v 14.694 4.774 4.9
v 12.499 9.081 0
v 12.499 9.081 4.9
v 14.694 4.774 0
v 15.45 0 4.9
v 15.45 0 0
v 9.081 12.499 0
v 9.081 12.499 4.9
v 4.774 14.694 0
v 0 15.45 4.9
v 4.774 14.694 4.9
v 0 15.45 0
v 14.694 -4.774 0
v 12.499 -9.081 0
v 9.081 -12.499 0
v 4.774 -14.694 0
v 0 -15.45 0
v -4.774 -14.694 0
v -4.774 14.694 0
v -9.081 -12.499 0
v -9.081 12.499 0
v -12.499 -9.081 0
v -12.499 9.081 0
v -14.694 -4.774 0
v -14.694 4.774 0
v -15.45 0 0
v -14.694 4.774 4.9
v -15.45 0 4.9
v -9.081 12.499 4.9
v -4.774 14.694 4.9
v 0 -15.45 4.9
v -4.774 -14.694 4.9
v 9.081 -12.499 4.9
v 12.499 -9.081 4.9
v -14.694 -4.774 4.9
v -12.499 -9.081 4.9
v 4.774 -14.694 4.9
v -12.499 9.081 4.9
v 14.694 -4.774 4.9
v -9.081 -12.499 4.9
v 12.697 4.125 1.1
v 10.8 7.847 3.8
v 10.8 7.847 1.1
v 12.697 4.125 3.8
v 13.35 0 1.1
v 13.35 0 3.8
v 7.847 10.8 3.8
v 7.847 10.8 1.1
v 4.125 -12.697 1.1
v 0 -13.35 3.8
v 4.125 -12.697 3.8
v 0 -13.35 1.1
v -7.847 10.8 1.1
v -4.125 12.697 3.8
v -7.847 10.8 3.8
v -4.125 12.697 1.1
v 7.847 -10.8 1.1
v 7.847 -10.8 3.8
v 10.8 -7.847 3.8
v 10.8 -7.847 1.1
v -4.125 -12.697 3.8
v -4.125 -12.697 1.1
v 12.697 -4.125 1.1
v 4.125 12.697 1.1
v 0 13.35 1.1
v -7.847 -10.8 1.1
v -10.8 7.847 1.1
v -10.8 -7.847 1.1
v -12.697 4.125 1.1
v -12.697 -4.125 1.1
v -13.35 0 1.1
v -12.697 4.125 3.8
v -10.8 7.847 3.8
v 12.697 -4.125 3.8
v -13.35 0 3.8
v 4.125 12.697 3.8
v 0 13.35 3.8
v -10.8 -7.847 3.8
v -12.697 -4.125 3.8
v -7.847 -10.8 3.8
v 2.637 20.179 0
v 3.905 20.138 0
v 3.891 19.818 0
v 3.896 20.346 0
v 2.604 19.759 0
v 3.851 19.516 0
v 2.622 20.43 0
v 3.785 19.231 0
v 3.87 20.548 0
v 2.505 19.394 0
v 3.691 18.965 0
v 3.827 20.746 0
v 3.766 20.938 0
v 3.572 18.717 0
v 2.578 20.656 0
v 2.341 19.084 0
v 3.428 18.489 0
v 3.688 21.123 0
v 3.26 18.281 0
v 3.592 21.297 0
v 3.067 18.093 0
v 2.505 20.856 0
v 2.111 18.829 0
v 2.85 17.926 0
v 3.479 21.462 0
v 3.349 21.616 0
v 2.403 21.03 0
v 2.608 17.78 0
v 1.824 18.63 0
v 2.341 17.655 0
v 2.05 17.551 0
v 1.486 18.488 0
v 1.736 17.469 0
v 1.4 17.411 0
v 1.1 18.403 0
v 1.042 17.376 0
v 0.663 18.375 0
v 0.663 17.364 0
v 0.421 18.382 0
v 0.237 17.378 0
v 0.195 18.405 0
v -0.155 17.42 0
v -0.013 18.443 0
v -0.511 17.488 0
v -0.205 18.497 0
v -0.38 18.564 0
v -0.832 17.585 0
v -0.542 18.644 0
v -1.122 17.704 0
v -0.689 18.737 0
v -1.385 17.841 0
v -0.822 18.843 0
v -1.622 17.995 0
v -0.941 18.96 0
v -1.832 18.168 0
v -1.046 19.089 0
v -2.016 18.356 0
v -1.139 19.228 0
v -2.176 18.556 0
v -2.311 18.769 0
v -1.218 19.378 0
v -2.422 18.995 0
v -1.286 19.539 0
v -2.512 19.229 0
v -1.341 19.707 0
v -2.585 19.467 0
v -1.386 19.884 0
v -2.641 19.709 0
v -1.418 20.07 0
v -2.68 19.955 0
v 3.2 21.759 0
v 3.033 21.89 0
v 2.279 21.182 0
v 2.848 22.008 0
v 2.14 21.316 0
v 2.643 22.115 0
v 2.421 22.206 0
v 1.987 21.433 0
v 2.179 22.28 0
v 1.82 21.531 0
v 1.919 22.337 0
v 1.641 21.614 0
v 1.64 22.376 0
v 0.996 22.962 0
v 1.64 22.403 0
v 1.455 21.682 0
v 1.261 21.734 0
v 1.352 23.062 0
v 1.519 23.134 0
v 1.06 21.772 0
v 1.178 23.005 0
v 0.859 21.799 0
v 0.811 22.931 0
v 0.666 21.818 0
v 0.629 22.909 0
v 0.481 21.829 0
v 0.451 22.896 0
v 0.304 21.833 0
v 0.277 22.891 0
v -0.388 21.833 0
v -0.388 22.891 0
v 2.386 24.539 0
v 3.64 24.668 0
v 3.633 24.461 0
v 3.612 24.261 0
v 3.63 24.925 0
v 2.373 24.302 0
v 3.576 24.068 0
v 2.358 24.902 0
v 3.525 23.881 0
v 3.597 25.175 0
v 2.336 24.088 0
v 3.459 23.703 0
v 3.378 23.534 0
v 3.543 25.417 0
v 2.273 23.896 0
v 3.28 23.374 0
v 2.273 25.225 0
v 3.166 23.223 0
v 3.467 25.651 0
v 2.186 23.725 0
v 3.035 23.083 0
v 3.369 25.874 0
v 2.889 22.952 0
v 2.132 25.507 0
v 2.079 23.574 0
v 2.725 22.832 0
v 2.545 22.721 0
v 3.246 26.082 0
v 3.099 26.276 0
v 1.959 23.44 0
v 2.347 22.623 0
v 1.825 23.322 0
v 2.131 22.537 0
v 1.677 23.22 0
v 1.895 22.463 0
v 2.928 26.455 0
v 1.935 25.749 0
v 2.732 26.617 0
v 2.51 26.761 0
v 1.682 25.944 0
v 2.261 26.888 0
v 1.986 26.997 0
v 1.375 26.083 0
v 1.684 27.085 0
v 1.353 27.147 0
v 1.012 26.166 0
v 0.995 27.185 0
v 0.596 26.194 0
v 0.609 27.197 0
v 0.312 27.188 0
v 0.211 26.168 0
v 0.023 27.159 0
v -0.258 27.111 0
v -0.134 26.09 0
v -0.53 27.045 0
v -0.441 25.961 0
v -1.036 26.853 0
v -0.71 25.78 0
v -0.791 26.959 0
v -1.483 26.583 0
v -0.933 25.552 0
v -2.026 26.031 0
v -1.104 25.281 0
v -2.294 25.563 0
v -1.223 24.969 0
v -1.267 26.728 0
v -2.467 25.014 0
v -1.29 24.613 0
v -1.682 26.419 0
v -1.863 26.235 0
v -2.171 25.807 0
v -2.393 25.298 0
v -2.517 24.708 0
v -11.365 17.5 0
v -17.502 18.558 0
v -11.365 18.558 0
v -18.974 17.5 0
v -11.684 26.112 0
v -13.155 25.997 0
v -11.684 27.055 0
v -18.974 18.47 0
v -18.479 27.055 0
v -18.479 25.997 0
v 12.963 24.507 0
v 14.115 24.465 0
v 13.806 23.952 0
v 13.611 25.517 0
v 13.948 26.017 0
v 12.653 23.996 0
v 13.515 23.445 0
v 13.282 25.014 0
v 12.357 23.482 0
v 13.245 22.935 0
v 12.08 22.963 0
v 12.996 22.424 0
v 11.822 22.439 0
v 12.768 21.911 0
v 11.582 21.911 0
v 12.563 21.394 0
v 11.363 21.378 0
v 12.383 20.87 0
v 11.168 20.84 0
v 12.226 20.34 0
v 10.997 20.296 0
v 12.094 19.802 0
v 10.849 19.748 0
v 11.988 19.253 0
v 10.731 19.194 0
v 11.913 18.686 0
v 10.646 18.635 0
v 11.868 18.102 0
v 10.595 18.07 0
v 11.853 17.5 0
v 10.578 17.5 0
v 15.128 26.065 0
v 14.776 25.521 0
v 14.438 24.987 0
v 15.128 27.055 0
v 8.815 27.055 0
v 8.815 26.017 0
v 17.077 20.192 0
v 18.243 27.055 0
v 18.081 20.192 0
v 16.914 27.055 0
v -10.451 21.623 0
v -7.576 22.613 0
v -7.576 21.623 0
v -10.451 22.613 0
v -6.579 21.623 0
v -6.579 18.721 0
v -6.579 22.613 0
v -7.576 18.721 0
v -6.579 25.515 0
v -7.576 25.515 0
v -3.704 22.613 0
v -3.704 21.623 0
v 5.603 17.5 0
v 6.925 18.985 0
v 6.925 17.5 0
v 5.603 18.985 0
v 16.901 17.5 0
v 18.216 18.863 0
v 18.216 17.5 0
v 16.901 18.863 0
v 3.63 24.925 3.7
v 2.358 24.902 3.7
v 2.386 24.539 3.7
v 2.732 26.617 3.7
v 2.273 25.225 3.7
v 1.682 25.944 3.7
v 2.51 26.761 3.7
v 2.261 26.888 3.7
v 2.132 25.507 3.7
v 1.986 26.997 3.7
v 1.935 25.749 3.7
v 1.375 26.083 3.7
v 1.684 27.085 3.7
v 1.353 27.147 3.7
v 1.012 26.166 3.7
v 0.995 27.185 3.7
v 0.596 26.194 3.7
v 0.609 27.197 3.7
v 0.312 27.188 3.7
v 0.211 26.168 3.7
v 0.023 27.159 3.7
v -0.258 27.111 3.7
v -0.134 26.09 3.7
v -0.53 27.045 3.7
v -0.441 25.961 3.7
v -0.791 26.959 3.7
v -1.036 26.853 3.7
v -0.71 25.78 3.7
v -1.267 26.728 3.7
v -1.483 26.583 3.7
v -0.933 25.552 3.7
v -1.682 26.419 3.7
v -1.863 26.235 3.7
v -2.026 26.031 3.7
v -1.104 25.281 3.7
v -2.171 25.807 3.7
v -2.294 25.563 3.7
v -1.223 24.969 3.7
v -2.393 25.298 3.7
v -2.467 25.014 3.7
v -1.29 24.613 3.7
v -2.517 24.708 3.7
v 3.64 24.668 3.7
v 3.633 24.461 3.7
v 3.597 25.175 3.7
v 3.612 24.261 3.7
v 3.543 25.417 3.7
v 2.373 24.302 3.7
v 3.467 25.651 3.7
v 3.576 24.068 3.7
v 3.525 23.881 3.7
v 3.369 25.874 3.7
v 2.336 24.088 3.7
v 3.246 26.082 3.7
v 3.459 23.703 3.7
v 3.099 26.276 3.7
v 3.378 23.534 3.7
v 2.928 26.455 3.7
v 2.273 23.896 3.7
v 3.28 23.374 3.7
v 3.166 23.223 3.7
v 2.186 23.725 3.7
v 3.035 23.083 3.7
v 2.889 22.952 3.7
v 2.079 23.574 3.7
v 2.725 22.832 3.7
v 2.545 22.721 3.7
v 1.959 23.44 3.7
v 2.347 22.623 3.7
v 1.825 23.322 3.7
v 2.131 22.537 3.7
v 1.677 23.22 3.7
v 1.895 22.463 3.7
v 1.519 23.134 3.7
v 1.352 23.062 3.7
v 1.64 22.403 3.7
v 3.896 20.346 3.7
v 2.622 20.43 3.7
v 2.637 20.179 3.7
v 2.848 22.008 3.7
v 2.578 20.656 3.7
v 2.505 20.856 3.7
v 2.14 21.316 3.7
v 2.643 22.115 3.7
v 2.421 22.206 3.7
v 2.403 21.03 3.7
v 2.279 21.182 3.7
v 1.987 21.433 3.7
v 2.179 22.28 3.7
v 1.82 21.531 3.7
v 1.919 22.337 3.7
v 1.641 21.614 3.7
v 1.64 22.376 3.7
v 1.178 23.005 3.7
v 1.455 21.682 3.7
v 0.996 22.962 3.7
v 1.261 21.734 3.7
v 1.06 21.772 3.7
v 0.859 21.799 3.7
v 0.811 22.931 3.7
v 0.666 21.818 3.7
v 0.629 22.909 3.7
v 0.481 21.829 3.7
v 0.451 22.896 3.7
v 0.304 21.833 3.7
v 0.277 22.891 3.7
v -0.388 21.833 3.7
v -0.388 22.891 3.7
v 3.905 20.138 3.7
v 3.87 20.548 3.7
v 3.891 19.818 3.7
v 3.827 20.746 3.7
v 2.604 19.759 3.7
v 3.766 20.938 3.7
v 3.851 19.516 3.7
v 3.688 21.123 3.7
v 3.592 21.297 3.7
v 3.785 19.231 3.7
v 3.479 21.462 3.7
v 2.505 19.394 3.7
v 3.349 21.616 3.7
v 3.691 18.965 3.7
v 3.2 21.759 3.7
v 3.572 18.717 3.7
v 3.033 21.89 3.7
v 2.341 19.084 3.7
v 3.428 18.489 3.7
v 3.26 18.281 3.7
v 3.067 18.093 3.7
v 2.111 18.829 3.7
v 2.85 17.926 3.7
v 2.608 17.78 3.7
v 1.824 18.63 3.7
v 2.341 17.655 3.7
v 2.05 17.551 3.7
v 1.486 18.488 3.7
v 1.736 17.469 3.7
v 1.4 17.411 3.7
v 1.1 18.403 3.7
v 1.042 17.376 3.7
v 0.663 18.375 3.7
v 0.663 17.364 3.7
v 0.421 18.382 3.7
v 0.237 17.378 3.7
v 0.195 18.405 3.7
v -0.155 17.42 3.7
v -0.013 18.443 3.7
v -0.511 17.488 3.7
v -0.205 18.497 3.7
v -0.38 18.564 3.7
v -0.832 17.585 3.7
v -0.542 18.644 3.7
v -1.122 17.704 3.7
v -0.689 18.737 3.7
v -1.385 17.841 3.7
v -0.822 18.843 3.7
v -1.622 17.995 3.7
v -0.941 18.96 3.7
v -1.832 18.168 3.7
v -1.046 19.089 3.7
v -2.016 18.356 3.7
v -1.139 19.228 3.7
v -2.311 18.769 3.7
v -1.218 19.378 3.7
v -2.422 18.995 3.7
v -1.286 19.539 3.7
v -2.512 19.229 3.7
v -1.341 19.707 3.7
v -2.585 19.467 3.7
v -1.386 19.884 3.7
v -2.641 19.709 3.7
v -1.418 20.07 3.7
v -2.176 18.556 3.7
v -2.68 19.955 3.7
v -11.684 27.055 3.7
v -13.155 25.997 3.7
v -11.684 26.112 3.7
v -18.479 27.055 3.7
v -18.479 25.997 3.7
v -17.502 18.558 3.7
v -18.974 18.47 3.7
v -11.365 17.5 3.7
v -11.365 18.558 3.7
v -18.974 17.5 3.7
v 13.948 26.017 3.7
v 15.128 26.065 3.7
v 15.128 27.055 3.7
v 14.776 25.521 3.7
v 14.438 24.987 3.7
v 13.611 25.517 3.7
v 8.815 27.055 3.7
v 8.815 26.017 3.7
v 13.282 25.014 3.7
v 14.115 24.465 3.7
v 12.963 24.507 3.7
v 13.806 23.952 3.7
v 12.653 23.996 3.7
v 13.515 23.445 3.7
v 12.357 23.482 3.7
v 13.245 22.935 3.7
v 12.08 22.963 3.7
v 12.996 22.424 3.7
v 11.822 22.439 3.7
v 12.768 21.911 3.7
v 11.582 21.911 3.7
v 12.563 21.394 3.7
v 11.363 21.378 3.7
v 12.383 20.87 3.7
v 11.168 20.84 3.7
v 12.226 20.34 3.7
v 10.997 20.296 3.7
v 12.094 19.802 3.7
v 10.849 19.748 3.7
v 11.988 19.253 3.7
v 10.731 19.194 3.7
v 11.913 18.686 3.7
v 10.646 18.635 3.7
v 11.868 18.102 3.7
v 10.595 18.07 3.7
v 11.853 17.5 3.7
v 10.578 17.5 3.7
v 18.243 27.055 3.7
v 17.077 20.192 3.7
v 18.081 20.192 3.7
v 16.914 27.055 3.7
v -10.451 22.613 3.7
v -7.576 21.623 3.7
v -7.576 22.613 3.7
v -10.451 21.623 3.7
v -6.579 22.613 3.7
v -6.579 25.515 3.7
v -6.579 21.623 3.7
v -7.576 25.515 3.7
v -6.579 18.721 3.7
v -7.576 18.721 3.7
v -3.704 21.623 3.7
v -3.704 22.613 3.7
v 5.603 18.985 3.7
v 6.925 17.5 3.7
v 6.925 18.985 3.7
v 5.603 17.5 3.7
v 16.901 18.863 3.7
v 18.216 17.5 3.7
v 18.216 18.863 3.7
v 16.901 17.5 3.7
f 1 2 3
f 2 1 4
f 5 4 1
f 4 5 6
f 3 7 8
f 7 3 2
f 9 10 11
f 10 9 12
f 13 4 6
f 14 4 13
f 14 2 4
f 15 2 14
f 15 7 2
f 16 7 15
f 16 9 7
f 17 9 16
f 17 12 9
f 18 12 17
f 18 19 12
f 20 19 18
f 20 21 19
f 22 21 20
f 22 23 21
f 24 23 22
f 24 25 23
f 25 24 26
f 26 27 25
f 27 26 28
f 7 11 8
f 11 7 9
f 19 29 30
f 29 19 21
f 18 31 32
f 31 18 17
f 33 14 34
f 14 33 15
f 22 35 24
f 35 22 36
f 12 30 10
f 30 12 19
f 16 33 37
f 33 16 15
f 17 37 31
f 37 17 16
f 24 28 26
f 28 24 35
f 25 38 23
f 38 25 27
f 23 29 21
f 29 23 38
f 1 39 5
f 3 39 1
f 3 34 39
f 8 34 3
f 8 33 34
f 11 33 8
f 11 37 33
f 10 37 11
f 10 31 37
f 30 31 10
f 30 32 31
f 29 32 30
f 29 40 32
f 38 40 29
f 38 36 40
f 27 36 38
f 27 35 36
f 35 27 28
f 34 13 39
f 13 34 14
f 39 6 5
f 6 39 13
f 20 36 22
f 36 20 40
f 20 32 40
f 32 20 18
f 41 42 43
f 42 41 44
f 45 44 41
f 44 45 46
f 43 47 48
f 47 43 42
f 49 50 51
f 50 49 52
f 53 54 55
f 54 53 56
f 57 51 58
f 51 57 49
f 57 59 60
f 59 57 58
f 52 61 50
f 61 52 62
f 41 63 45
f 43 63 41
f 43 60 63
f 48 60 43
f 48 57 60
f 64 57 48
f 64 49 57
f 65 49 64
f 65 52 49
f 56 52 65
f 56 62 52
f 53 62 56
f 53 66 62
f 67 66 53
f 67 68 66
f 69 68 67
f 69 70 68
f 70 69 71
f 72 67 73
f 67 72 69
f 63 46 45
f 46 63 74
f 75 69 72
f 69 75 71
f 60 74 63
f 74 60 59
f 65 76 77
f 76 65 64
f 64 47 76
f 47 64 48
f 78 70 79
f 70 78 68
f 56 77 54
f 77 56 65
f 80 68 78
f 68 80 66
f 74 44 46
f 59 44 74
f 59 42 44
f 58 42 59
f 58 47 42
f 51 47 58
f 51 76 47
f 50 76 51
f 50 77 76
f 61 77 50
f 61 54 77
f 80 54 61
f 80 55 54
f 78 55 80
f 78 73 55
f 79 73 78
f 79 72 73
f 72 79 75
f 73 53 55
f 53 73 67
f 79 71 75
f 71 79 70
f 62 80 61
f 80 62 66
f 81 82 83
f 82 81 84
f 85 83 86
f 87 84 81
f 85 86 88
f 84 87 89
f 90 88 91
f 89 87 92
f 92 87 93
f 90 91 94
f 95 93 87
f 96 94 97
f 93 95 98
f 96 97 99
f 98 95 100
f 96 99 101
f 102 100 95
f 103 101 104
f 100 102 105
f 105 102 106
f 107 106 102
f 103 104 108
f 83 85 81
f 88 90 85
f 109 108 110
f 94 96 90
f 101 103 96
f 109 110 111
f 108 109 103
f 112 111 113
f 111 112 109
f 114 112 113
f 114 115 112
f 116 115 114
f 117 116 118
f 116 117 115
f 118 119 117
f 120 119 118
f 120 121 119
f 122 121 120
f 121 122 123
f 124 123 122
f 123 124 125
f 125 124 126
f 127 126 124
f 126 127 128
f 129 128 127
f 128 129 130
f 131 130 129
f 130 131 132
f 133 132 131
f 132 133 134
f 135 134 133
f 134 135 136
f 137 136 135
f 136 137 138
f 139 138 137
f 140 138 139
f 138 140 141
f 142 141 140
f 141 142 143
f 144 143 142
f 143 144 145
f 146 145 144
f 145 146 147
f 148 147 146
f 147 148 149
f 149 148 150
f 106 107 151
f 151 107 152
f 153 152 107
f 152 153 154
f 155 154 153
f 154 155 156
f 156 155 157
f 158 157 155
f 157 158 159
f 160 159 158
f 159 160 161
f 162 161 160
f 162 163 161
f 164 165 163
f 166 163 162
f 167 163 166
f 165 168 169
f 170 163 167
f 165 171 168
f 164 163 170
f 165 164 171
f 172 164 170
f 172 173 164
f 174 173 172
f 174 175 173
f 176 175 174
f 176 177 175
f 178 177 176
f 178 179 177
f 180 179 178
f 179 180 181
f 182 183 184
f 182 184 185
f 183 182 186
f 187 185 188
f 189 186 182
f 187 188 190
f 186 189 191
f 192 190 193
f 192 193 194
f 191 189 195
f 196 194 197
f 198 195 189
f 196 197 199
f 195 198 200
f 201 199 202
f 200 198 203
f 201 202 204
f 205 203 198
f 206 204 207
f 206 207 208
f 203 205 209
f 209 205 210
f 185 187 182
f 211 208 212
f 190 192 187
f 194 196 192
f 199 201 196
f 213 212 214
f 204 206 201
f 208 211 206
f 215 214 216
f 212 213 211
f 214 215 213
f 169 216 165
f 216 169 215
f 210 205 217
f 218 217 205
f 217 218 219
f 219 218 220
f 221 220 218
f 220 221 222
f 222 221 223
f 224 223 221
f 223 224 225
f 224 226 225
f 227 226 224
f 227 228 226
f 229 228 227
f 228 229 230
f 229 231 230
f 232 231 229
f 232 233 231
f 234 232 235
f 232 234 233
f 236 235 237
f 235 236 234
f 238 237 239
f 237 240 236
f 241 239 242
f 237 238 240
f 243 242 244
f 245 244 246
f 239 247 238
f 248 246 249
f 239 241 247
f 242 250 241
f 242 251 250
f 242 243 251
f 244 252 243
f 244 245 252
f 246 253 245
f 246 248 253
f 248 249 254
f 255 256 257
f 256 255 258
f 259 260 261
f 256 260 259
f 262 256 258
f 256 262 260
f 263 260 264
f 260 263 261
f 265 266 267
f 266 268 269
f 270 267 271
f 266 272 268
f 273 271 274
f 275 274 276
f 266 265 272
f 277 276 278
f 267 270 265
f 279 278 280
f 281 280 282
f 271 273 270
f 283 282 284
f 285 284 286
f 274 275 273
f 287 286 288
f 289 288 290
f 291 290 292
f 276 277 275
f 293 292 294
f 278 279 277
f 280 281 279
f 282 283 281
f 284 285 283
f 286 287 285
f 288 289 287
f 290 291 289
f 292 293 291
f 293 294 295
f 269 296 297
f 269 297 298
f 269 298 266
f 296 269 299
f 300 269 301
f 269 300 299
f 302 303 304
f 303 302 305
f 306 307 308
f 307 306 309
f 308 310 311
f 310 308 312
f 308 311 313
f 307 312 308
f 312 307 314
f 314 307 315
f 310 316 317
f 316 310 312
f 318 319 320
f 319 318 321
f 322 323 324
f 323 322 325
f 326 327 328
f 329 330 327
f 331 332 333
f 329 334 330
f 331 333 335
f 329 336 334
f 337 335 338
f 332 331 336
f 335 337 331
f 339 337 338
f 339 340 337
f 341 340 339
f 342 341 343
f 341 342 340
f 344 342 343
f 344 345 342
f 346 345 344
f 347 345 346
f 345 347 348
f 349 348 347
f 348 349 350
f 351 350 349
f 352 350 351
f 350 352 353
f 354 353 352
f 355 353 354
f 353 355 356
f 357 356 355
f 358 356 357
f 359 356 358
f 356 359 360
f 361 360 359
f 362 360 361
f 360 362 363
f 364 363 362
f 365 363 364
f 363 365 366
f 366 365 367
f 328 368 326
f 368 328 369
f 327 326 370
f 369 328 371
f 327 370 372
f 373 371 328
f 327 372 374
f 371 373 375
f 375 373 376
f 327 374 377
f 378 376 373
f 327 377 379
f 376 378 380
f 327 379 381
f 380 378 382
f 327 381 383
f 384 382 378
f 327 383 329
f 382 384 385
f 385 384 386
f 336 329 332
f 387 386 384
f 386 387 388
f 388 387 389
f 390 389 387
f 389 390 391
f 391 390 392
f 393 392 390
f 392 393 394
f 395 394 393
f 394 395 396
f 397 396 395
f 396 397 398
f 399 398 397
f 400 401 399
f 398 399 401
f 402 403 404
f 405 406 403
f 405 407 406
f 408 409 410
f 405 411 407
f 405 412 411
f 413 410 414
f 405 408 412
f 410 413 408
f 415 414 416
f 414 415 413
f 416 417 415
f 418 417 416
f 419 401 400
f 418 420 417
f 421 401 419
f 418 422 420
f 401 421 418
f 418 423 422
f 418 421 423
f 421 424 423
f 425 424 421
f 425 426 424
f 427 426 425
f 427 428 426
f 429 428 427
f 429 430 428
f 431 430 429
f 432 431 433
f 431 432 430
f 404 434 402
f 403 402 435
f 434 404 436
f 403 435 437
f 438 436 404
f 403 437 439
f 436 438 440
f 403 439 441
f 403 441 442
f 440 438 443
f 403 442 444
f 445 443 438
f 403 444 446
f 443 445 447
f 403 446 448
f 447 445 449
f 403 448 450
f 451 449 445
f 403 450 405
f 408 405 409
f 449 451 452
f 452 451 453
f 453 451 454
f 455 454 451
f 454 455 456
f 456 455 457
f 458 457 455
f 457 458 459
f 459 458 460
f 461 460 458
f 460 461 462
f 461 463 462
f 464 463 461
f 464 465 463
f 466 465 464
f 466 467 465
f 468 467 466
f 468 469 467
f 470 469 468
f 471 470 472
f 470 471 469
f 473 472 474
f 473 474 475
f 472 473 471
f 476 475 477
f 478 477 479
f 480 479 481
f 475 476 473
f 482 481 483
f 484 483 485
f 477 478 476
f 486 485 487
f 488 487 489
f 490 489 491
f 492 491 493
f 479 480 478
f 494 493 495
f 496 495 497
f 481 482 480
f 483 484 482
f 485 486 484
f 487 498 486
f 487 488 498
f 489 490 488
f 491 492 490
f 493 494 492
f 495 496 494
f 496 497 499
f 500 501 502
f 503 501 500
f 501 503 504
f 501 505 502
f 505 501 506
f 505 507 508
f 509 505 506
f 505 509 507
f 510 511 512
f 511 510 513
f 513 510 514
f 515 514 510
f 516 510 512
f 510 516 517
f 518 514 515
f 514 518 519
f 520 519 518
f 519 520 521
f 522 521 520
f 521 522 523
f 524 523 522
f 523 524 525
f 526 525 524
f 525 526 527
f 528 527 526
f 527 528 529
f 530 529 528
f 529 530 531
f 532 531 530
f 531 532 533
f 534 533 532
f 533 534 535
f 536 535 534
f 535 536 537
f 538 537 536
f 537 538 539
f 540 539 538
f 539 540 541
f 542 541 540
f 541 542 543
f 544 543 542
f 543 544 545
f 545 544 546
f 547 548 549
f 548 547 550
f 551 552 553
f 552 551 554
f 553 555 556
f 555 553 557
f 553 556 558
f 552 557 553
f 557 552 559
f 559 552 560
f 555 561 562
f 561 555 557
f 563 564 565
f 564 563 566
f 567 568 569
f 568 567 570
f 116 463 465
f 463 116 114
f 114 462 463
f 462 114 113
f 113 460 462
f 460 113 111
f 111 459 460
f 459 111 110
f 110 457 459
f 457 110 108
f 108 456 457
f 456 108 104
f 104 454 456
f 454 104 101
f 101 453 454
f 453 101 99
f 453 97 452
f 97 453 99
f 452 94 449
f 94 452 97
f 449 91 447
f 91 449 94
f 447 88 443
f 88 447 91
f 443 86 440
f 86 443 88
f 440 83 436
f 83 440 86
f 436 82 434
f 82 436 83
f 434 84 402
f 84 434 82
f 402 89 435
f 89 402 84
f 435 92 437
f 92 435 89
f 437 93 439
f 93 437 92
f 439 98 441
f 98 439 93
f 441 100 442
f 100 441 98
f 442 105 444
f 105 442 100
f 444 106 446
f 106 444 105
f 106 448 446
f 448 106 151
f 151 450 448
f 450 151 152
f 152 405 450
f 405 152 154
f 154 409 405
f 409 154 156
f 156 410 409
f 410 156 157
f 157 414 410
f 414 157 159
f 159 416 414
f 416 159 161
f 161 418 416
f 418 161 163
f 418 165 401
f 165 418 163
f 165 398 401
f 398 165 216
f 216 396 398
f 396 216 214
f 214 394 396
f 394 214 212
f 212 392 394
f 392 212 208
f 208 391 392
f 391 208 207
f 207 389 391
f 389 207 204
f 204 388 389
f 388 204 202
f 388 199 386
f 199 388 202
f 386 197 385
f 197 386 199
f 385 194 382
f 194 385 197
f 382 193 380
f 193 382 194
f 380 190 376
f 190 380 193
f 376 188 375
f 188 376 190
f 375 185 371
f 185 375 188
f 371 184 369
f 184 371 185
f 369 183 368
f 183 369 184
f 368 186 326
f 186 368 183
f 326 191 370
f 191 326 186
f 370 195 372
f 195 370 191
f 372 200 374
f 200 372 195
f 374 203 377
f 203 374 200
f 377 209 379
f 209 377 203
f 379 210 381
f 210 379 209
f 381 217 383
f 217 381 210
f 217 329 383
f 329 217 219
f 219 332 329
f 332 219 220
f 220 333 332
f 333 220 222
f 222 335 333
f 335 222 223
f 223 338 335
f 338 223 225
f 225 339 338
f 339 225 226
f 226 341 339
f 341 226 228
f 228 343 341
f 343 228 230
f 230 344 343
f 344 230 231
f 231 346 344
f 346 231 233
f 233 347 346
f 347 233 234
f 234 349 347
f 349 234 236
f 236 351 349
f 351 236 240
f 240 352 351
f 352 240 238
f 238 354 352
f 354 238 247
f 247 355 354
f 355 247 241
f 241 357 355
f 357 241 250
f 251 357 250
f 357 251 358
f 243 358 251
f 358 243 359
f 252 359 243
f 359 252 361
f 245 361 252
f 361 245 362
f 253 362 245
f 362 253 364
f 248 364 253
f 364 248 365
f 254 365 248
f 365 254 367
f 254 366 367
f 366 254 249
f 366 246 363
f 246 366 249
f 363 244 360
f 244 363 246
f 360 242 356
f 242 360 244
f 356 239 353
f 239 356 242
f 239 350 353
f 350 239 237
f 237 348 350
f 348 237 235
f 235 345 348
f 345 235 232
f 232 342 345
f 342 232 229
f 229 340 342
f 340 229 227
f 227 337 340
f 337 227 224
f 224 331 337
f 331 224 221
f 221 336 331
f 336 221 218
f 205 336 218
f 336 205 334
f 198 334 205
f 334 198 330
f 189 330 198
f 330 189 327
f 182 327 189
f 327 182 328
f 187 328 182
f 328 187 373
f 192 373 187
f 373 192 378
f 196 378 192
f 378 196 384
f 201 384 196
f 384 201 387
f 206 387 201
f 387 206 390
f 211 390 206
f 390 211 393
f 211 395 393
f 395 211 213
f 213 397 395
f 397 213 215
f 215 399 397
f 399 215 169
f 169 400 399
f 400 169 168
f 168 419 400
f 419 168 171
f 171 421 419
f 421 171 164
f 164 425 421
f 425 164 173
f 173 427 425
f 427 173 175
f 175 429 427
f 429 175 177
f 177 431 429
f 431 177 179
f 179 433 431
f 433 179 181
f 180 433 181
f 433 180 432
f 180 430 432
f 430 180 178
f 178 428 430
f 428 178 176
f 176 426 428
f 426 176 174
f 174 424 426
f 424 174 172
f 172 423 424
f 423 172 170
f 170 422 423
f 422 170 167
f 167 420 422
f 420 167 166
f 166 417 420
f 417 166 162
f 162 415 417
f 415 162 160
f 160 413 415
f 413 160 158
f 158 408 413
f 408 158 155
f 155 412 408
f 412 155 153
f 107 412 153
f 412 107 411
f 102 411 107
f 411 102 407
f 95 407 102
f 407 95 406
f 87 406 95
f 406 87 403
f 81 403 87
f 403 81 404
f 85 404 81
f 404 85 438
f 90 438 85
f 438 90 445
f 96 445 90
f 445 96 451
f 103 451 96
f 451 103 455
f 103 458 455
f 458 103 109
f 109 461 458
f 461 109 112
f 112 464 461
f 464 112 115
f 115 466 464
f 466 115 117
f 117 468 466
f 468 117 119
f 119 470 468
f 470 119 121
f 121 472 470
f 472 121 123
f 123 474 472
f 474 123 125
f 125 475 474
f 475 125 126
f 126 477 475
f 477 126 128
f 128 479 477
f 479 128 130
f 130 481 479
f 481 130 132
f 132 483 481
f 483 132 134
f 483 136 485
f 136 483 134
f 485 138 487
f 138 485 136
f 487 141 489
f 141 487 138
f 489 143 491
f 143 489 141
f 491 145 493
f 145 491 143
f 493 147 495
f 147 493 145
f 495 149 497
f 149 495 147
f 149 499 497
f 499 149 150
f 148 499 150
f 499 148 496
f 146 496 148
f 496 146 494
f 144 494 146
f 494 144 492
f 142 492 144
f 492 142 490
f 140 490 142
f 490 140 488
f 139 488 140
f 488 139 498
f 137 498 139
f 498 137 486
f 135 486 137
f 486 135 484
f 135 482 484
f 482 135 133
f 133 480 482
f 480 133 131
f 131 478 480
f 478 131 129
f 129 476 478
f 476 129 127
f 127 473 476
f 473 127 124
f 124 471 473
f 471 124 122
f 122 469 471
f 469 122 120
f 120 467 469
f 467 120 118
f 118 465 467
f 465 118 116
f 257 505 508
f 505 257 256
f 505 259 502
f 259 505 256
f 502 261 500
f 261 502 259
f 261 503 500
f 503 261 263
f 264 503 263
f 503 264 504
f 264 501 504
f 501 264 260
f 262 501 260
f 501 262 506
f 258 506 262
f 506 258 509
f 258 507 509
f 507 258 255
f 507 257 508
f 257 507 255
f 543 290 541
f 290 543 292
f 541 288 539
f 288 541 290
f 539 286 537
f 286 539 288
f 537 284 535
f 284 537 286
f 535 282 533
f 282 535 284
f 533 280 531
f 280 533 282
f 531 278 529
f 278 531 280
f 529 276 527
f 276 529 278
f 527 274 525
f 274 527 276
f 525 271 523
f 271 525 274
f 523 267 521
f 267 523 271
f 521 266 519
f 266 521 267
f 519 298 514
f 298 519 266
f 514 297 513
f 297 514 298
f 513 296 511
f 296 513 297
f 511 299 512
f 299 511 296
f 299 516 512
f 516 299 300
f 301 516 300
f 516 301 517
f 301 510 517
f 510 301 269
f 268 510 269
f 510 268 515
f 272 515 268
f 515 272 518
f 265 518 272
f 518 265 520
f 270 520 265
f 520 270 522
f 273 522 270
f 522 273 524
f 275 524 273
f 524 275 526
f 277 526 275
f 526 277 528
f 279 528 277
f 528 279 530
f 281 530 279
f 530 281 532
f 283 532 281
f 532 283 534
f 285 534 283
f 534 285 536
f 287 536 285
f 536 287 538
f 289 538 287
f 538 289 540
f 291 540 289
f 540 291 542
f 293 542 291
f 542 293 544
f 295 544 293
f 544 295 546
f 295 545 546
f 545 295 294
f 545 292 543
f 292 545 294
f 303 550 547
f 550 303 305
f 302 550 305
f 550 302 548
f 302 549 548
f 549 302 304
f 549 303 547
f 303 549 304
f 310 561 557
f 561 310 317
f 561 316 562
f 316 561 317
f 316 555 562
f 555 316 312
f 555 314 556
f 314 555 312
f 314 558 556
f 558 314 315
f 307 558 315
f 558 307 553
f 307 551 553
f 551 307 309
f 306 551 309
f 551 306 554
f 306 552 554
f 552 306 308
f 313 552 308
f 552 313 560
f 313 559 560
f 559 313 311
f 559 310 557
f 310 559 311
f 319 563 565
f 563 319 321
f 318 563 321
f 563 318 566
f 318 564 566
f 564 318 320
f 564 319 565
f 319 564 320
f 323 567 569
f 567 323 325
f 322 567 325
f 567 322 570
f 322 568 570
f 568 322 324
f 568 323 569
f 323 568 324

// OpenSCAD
//This is Coin Hider Parametric v1. You can use this print to hide a coin as a prank or to keep your coins in mint condition.

//Pause printing to insert coin, or print two or more coins far apart and insert the coins when it's printing the external perimeter of the other coin(s).

di=25.80;   //enter coin diameter
he=2.28;    //enter coin height
ml=0.15;    //enter printer layer thickness
mf=0.25;    //enter printer 1st layer thickness
me=0.30;    //enter printer extrude size
lm=2;       //enter layer margin (nom=2)
pm=2;       //enter perimeter margin (nom=2)
tp=2.00;    //enter thickness of perimeter
ts=1.00;    //enter thickness of top/bottom
fr=20;      //enter number of fragments

//Coin capsule
translate([0,0,(mf+round((ts-mf)/ml+0.5)*ml+(lm+round(he/ml+0.5))*ml+round(ts/ml+0.5)*ml)/2])
    difference()
        {
            cylinder (
                h=mf+round((ts-mf)/ml+0.5)*ml
                    +(lm+round(he/ml+0.5))*ml
                    +round(ts/ml+0.5)*ml,
                d=(pm+round(di/me+0.5))*me
                    +2*round(tp/me+0.5)*me,
                $fn=fr,center=true);
            cylinder(
                h=(lm+round(he/ml+0.5))*ml,
                d=(pm+round(di/me+0.5))*me,
                $fn=fr,center=true);
            //Breakplate, if you really want to, just remove comment markers bofore cube
            //cube([1.1*((pm+round(di/me+0.5))*me+2*round(tp/me+0.5)*me),ml,(1.1*(mf+round((ts-mf)/ml+0.5)*ml+(lm+round(he/ml+0.5))*ml+round(ts/ml+0.5)*ml))],true);
        };

//Text for height of coin insertion with 
te=str("Z+", (mf+round((ts-mf)/ml+0.5)*ml+(lm+round(he/ml+0.5))*ml-ml), "!");
linear_extrude(height = (mf+round((ts-mf)/ml+0.5)*ml+(lm+round(he/ml+0.5))*ml-ml), center = false, convexity = 10, twist = 0)
        translate([0,di/2+2*me+2*tp,0.5])
        text(te,size=10,halign="center",valign="baseline");
    
echo(str("Insert coin @ ",te));
